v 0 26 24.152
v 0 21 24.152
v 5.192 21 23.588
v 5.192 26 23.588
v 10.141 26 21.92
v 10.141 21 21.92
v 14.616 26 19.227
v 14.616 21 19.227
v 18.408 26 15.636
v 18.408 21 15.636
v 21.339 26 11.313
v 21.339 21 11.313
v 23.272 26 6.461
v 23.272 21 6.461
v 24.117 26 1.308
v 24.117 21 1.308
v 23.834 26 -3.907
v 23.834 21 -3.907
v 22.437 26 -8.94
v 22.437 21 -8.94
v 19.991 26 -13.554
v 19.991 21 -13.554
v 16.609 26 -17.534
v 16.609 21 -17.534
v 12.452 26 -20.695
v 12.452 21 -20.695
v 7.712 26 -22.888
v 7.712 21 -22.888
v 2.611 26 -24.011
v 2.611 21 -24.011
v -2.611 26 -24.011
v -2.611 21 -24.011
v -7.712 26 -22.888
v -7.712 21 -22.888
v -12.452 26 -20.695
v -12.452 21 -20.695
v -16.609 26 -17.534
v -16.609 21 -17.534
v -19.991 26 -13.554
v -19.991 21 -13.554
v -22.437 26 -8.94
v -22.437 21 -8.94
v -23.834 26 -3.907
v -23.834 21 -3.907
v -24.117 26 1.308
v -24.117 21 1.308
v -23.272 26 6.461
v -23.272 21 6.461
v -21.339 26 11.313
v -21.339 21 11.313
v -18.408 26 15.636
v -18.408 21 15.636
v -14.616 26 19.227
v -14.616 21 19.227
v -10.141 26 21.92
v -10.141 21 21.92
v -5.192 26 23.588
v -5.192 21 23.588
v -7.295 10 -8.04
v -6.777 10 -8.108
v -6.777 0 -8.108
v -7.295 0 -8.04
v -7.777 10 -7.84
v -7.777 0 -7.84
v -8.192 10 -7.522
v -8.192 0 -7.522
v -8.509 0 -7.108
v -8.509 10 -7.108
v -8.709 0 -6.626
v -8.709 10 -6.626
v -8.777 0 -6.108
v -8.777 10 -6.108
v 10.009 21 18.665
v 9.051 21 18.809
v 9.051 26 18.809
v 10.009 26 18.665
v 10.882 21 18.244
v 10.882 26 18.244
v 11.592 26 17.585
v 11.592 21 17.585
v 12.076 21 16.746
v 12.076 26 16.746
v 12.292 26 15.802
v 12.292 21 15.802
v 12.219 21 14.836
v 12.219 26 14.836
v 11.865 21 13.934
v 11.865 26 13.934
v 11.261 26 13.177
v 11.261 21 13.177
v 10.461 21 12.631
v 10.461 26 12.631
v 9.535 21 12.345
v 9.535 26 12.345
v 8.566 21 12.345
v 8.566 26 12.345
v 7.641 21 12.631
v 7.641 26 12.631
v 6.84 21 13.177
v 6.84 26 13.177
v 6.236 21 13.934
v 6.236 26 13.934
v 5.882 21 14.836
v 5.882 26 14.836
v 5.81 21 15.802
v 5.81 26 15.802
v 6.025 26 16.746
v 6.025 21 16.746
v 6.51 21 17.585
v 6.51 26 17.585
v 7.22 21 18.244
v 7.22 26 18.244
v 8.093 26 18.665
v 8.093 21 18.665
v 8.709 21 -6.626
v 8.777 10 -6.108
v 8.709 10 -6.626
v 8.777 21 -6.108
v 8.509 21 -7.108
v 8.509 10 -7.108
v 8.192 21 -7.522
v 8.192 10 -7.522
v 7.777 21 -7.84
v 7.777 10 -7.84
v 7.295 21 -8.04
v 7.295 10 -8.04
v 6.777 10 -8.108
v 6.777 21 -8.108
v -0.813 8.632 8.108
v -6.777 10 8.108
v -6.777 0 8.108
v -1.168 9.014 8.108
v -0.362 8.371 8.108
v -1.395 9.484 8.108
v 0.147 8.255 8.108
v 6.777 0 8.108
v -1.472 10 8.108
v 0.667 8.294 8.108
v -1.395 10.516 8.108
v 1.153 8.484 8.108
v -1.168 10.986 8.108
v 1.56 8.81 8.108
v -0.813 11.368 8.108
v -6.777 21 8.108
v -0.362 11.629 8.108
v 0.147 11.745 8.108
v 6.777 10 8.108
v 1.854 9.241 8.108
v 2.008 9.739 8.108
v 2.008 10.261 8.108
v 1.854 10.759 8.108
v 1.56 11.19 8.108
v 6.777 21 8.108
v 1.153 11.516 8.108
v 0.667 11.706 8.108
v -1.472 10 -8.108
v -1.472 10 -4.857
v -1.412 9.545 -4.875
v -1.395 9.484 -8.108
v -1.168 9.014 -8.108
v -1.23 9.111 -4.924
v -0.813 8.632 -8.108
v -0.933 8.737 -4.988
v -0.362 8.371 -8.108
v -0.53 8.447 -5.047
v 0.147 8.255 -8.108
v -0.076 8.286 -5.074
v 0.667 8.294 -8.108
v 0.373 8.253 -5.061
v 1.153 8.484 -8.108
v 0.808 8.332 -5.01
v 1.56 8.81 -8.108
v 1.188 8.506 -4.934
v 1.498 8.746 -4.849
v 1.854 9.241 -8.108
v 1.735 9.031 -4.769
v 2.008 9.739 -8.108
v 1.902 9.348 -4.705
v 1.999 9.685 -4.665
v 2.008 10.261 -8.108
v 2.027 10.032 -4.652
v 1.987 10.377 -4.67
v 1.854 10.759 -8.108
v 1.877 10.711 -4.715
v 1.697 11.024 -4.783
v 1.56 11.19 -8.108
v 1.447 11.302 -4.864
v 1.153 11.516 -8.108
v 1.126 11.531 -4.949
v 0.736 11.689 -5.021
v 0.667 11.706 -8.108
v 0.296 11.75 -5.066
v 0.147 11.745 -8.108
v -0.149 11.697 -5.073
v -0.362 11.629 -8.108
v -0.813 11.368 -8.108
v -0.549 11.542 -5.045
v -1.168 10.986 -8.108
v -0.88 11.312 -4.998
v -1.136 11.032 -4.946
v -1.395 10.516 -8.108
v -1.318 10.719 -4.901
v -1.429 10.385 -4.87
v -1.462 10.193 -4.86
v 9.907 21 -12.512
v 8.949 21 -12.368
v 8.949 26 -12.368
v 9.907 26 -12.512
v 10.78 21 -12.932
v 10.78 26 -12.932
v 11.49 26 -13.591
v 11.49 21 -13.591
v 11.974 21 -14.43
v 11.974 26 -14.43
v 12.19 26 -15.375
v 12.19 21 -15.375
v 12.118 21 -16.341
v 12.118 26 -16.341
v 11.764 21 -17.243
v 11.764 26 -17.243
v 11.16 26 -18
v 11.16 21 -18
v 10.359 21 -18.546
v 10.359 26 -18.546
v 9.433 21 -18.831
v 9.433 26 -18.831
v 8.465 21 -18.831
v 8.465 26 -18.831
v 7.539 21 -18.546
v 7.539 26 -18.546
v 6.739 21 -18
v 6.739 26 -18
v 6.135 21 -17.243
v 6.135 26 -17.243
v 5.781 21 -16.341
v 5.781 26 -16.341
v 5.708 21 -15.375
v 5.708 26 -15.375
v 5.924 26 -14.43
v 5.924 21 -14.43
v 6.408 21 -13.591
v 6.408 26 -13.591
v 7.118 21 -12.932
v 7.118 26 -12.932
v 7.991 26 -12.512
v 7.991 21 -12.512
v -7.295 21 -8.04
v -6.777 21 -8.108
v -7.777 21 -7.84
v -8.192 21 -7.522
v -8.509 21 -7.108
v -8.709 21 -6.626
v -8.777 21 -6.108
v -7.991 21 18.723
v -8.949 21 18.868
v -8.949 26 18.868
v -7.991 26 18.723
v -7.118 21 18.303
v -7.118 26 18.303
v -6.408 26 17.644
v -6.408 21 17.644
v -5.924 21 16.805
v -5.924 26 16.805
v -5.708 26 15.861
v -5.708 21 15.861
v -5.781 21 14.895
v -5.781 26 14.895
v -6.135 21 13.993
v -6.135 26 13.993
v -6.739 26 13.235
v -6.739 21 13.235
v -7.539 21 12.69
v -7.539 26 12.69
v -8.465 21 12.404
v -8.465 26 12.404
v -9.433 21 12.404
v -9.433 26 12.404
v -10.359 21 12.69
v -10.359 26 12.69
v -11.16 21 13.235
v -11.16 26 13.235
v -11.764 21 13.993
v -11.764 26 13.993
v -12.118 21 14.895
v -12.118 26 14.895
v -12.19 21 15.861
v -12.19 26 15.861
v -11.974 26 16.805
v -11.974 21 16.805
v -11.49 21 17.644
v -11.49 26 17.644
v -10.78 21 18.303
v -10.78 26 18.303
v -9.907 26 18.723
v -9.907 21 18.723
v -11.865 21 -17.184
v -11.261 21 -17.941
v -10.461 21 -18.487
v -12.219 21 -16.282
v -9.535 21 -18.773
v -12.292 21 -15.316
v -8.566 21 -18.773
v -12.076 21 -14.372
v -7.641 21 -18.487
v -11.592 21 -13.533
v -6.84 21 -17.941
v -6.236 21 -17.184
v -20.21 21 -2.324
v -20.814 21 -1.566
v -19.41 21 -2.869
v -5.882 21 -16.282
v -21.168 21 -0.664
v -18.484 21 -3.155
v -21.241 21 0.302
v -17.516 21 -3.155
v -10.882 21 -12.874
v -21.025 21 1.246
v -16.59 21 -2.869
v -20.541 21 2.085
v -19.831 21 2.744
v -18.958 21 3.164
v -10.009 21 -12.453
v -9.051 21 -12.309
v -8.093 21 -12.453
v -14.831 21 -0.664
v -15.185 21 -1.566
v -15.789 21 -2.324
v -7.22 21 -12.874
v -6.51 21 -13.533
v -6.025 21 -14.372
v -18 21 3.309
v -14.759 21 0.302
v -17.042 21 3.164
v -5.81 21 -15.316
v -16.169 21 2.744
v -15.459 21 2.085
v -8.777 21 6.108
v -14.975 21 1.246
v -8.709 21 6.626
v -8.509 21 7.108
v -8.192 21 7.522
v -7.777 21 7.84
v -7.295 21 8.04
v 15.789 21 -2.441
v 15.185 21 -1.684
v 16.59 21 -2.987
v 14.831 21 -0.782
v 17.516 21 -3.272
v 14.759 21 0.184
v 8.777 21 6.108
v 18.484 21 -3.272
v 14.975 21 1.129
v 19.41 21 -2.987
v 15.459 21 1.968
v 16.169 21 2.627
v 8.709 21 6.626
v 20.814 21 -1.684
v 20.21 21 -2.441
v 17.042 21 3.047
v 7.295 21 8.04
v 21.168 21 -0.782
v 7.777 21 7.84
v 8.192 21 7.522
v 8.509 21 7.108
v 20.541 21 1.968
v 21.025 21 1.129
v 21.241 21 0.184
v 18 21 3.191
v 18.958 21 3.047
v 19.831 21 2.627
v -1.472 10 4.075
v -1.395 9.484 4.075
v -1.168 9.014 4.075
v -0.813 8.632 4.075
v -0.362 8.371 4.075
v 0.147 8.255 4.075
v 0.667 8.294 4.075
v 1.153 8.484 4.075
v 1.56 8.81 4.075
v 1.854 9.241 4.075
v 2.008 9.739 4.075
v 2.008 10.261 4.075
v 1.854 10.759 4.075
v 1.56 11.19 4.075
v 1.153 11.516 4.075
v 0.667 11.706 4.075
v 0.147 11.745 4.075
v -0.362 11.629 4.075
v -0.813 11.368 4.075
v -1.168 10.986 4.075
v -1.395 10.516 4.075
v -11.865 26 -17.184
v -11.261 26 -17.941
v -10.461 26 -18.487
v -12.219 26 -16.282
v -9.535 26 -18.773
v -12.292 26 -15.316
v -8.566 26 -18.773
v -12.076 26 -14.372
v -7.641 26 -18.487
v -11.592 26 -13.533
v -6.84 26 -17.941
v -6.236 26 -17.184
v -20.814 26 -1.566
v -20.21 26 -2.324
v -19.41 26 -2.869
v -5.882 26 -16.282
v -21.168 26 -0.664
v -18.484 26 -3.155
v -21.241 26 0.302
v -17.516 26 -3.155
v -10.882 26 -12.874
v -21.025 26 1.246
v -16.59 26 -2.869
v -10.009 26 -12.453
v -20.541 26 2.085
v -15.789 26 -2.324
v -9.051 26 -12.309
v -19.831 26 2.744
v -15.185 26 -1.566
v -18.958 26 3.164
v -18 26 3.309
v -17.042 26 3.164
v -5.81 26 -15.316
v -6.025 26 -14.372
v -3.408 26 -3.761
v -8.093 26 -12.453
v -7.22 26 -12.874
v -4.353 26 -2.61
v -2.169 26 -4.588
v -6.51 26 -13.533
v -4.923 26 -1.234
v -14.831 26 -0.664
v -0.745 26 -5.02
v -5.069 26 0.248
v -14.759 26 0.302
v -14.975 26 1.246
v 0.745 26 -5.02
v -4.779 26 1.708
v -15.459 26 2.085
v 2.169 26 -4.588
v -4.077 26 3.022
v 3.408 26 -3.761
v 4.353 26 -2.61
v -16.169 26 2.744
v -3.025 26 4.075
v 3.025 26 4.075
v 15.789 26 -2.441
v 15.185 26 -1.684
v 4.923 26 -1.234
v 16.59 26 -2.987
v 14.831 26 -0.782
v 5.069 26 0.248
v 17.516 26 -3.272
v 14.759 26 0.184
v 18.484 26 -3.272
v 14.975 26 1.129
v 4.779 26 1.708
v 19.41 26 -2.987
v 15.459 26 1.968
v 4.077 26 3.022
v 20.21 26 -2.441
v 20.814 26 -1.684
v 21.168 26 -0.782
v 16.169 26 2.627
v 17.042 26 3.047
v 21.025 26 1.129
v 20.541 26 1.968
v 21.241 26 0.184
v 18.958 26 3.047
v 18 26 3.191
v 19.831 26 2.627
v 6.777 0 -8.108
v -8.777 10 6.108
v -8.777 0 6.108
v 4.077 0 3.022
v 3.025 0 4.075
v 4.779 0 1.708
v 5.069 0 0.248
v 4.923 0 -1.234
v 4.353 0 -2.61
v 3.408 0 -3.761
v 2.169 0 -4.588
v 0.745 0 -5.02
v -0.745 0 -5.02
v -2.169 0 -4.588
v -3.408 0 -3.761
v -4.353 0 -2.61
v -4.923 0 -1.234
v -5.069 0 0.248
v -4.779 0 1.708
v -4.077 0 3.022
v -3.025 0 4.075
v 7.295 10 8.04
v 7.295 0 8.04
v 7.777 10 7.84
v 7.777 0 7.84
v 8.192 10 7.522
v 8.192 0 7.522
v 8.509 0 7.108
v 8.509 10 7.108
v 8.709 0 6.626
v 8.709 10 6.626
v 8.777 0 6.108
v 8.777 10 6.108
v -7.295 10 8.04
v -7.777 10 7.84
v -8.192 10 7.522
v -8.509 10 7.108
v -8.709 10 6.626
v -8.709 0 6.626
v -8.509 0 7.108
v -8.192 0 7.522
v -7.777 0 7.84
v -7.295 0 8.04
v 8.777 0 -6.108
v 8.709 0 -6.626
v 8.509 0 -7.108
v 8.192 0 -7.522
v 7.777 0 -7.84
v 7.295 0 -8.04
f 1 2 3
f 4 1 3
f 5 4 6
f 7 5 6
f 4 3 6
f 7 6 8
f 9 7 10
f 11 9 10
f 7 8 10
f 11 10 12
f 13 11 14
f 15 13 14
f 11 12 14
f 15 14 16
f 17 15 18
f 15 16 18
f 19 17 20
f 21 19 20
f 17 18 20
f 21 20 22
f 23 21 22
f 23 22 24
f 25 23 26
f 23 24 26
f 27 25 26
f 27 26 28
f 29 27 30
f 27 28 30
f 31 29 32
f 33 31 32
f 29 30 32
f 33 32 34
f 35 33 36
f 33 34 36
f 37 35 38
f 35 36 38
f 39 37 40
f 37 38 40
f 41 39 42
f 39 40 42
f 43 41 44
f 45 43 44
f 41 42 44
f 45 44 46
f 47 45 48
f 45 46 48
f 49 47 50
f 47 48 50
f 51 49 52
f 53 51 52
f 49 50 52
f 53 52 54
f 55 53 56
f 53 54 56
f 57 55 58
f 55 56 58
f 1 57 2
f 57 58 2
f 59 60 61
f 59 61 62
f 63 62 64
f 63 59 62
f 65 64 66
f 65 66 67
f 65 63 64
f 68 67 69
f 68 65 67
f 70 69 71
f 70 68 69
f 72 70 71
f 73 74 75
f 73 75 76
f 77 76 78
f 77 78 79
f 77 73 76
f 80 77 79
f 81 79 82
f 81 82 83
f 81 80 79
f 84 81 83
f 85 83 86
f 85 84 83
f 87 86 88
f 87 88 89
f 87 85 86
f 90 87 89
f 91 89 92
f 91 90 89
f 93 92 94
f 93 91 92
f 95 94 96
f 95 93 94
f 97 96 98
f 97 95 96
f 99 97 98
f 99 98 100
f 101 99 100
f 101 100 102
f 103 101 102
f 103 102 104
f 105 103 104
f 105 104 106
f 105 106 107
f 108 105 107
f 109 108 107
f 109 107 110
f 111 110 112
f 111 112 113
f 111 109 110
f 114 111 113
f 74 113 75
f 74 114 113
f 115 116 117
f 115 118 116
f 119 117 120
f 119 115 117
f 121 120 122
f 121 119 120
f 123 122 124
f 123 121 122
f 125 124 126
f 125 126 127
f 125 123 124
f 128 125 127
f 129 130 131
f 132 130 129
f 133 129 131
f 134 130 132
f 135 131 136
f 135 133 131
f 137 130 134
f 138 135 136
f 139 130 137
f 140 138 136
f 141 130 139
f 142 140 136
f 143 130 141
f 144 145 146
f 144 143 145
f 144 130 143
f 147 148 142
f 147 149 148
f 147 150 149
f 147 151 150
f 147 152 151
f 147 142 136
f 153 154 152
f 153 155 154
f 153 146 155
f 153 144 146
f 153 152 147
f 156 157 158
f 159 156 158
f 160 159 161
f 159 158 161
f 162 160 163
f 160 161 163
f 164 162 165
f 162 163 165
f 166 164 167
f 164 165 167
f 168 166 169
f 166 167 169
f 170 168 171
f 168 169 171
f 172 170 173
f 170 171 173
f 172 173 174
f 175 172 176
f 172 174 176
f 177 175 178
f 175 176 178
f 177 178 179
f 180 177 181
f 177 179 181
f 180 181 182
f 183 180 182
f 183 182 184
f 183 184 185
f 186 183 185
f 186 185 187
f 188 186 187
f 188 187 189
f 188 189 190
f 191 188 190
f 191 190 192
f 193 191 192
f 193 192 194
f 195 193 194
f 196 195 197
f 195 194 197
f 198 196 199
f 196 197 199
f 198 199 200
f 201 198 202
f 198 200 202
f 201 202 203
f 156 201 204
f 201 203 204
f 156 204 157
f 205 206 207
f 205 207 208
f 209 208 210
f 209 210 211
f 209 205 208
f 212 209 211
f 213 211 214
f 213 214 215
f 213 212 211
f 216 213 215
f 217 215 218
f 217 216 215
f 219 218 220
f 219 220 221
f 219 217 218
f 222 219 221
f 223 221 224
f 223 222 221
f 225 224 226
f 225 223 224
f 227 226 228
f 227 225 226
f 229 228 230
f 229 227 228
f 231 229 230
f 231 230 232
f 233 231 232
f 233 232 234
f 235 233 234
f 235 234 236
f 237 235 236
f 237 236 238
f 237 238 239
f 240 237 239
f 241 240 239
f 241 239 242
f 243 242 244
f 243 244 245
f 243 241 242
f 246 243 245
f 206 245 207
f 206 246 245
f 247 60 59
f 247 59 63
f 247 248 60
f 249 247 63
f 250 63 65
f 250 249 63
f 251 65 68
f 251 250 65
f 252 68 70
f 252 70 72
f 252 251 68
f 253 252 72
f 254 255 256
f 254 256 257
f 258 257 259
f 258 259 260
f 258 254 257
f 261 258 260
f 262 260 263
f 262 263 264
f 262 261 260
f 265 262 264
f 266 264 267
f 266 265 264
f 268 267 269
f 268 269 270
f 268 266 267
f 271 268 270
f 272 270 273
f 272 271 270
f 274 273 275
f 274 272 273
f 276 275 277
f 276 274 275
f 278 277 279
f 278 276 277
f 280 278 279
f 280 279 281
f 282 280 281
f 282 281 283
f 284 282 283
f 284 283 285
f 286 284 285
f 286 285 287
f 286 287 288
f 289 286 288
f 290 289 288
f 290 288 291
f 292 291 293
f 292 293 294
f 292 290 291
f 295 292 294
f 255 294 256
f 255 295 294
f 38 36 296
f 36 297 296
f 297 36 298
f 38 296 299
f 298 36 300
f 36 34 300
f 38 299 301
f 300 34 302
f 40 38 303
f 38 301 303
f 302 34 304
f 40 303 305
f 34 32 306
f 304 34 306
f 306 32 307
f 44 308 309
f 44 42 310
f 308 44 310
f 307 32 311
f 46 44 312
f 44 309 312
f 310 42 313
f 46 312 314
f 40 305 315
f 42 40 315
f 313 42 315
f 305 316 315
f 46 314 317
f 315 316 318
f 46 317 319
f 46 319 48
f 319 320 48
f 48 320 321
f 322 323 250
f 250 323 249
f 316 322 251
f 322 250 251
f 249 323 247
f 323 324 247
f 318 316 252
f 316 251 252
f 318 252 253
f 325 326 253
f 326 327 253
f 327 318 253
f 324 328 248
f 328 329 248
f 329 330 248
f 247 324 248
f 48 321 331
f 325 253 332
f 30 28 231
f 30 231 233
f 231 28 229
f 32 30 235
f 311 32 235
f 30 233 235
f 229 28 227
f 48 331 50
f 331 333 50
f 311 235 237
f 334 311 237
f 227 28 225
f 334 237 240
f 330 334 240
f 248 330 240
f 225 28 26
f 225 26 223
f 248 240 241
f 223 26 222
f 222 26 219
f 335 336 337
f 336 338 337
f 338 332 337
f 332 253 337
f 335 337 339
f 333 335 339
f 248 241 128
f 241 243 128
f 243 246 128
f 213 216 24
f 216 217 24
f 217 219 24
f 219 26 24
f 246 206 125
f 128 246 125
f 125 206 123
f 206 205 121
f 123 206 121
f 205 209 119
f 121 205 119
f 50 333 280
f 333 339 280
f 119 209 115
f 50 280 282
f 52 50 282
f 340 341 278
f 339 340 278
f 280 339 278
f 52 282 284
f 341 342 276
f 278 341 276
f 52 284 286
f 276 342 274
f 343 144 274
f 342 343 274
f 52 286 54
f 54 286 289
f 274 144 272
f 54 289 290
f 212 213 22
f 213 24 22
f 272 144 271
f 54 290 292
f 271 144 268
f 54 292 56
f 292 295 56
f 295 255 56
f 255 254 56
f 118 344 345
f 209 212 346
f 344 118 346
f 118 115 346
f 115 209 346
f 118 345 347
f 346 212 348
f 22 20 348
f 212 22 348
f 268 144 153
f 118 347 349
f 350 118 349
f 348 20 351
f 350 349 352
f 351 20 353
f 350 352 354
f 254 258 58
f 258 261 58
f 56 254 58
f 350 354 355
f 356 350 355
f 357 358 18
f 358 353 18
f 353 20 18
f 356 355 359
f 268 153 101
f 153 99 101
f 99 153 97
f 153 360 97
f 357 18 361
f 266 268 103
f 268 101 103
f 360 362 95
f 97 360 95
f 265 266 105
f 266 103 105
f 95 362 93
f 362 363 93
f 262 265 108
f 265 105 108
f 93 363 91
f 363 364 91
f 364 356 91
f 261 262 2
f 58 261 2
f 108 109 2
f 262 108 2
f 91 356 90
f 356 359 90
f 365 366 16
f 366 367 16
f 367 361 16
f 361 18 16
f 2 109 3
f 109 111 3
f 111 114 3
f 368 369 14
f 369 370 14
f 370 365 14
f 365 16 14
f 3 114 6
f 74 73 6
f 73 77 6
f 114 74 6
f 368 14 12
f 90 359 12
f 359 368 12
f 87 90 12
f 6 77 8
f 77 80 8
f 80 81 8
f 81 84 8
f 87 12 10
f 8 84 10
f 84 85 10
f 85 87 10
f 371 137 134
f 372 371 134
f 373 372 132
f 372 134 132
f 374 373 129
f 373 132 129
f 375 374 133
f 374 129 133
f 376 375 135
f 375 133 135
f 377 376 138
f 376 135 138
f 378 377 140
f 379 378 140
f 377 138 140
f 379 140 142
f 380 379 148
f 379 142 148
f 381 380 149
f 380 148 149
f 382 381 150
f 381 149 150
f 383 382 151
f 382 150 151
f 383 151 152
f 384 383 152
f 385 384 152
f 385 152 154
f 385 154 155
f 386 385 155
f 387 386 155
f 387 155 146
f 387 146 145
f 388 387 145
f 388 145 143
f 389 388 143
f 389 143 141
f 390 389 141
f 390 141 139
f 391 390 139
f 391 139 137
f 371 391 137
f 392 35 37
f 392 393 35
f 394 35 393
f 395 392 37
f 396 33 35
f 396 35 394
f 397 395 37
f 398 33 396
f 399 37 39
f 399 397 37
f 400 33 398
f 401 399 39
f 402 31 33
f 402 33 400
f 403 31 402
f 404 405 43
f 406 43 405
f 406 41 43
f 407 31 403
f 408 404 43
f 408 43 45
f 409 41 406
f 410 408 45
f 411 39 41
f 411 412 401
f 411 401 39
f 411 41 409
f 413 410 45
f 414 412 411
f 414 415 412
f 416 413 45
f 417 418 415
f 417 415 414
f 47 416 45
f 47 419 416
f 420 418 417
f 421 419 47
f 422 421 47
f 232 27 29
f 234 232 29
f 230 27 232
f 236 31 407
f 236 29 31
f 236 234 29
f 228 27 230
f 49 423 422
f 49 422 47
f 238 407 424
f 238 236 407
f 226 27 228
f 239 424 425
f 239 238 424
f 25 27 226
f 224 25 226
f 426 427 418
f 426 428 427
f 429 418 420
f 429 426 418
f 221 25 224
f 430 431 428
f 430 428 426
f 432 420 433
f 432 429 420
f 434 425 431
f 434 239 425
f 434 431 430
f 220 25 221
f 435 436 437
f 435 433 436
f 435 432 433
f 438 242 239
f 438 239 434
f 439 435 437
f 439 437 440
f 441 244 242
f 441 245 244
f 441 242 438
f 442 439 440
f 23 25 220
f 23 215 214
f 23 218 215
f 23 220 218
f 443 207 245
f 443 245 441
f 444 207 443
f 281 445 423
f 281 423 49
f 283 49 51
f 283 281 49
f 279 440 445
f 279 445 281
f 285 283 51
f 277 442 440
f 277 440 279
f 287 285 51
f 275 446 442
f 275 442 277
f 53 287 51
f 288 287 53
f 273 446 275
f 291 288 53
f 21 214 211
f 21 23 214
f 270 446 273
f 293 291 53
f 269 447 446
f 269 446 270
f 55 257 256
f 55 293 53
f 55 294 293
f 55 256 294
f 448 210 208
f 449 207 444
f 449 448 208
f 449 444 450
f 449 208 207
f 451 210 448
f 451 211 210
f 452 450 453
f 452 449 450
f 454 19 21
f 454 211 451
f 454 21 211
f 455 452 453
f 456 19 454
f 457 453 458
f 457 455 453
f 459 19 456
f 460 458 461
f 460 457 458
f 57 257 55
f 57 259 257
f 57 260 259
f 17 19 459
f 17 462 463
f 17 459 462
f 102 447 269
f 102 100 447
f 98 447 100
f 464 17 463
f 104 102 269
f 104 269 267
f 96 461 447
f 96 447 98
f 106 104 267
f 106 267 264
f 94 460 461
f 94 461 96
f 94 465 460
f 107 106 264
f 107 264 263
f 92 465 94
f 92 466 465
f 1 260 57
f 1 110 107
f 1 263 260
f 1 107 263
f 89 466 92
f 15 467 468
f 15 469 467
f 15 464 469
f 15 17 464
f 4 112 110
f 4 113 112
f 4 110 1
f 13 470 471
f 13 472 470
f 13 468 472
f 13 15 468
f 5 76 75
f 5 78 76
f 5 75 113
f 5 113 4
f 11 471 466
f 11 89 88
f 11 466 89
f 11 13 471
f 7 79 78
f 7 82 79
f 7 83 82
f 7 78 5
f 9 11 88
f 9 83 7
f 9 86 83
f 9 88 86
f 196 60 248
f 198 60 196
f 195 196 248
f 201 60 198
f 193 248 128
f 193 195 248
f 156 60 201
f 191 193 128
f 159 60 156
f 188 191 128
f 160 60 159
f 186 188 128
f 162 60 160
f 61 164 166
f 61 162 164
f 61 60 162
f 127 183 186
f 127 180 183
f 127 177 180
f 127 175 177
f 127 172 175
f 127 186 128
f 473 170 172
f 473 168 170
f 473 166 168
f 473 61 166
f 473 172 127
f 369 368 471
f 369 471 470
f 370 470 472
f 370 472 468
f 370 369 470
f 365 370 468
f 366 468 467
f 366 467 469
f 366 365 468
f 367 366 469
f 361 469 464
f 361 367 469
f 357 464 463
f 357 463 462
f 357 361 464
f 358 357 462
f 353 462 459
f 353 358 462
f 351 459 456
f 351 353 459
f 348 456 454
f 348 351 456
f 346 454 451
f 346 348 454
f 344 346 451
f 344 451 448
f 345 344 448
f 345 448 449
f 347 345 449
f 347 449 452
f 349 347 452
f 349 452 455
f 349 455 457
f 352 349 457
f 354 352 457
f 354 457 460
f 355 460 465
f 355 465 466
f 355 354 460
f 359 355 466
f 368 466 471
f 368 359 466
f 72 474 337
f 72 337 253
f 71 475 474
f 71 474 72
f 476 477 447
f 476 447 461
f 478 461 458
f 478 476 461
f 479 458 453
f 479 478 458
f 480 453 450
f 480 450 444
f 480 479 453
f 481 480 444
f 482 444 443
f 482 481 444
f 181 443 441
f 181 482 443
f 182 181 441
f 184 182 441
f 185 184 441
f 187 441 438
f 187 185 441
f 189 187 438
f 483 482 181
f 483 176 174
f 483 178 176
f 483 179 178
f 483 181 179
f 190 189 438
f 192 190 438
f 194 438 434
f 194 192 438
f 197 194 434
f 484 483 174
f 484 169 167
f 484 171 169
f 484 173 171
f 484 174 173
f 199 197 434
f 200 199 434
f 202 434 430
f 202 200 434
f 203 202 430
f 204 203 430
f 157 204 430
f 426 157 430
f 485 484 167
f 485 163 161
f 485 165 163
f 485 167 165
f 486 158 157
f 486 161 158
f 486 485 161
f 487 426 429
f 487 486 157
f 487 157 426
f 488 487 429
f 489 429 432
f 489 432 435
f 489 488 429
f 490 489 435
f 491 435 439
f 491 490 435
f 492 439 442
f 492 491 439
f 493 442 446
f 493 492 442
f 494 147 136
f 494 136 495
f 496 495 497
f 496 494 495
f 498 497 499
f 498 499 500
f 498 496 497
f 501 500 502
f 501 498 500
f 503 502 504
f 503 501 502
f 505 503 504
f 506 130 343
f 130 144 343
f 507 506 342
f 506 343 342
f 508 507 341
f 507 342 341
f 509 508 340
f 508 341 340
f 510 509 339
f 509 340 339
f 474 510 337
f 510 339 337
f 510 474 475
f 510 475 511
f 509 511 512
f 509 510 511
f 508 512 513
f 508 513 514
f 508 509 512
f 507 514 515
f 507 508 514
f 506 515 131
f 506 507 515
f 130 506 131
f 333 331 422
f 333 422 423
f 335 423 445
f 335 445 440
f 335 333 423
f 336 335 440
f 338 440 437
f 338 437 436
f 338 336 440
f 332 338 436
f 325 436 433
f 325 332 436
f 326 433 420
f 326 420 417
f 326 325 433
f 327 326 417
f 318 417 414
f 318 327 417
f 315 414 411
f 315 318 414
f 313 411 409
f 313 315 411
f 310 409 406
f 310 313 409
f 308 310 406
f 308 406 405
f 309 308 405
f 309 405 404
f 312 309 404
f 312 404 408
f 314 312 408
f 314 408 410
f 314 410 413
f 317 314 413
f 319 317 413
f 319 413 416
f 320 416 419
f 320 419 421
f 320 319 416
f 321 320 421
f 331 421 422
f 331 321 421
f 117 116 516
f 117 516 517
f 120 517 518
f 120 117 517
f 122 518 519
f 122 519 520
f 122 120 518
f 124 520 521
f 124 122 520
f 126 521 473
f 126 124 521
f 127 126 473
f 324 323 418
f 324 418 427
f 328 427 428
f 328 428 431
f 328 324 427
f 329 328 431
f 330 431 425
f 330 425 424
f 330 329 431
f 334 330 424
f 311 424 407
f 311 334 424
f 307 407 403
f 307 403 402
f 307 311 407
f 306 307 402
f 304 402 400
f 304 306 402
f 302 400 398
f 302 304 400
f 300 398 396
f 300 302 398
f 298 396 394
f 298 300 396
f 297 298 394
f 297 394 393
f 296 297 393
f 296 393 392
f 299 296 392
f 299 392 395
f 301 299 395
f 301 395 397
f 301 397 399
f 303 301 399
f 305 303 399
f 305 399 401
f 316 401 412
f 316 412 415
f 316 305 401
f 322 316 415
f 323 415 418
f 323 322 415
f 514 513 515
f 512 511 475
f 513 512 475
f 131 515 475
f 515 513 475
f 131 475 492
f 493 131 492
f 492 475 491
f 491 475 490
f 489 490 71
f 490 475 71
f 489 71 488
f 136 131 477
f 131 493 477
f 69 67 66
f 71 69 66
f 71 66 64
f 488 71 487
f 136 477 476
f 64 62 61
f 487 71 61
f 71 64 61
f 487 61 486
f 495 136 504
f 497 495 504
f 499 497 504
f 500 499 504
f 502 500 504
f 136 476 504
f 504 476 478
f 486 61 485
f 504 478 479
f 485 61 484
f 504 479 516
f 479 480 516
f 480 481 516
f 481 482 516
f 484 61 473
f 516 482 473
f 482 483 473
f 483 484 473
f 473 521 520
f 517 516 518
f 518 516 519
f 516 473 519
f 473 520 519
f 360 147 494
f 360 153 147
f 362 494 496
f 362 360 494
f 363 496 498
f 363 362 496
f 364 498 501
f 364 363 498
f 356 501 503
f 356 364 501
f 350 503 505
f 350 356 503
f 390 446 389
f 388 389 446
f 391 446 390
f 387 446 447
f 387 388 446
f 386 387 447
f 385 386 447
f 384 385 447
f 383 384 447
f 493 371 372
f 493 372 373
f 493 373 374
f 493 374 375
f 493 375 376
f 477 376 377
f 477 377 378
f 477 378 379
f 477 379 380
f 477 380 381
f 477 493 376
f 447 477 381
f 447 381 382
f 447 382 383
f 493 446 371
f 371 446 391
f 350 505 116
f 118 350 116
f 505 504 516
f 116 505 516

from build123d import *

# Parameters (mm, degrees)
SKETCH_1_W                      = 30
SKETCH_1_H                      = 30
SKETCH_1_W_2                    = 21.5
SKETCH_1_H_2                    = 21.5
EXTRUDE_1_DEPTH                 = 5
SKETCH_2_W                      = 30
SKETCH_2_H                      = 30
EXTRUDE_2_DEPTH                 = 5
SKETCH_4_W                      = 17.554664
SKETCH_4_H                      = 16.21575
EXTRUDE_3_DEPTH                 = 11
SKETCH_5_R                      = 24.152219
SKETCH_5_R_2                    = 3.25
EXTRUDE_4_DEPTH                 = 5
CUT_EXTRUDE_2_DEPTH             = 21
FILLET_1_R                      = 2
SKETCH_10_W                     = 21.5
SKETCH_10_H                     = 21.5
EXTRUDE_5_DEPTH                 = 5
CUT_EXTRUDE_3_REACH             = 49.959
SKETCH_11_R                     = 1.75
CUT_EXTRUDE_3_DIRECTION_2_REACH = 49.959
SKETCH_12_R                     = 24.152219
CUT_EXTRUDE_4_DEPTH             = 21
CUT_EXTRUDE_5_REACH             = 42.096


with BuildPart() as part:
    # 草图1 → 凸台-拉伸1 (new body)
    with BuildSketch(Plane(origin=(0, 0, 0), x_dir=(1, 0, 0), z_dir=(0, 1, 0))):
        Rectangle(SKETCH_1_W, SKETCH_1_H)
        Rectangle(SKETCH_1_W_2, SKETCH_1_H_2, mode=Mode.SUBTRACT)
    extrude(amount=EXTRUDE_1_DEPTH)

    # 草图2 → 凸台-拉伸2 (add)
    with BuildSketch(Plane(origin=(0, 5, 0), x_dir=(1, 0, 0), z_dir=(0, 1, 0))):
        Rectangle(SKETCH_2_W, SKETCH_2_H)
    extrude(amount=EXTRUDE_2_DEPTH)

    # 草图4 → 凸台-拉伸3 (add)
    with BuildSketch(Plane(origin=(0, 10, 0), x_dir=(1, 0, 0), z_dir=(0, 1, 0))):
        Rectangle(SKETCH_4_W, SKETCH_4_H)
    extrude(amount=EXTRUDE_3_DEPTH)

    # 草图5 → 凸台-拉伸4 (add)
    with BuildSketch(Plane(origin=(0, 21, 0), x_dir=(1, 0, 0), z_dir=(0, 1, 0))):
        with Locations(Location((0, 0, 0), (0, 0, 270))):
            Circle(SKETCH_5_R)
        with Locations(Location((8.9491, 15.617734, 0), (0, 0, 270))):
            Circle(SKETCH_5_R_2, mode=Mode.SUBTRACT)
        with Locations(Location((17.999904, 0.058719, 0), (0, 0, 270))):
            Circle(SKETCH_5_R_2, mode=Mode.SUBTRACT)
        with Locations(Location((9.050804, -15.559015, 0), (0, 0, 270))):
            Circle(SKETCH_5_R_2, mode=Mode.SUBTRACT)
        with Locations(Location((-8.9491, -15.617734, 0), (0, 0, 270))):
            Circle(SKETCH_5_R_2, mode=Mode.SUBTRACT)
        with Locations(Location((-17.999904, -0.058719, 0), (0, 0, 270))):
            Circle(SKETCH_5_R_2, mode=Mode.SUBTRACT)
        with Locations(Location((-9.050804, 15.559015, 0), (0, 0, 270))):
            Circle(SKETCH_5_R_2, mode=Mode.SUBTRACT)
    extrude(amount=EXTRUDE_4_DEPTH)

    # 草图6 → 切除-拉伸2 (cut)
    with BuildSketch(Plane.XZ.offset(-5)):
        with BuildLine():
            Line((-3.024897, 4.075), (3.024897, 4.075))
            ThreePointArc((3.024897, 4.075), (0, -5.075), (-3.024897, 4.075))
        make_face()
    extrude(amount=-CUT_EXTRUDE_2_DEPTH, mode=Mode.SUBTRACT)

    # 圆角1
    fillet_1_edges = [part.edges().sort_by_distance(p)[0] for p in [
        (-8.777332, 15.5, -8.107875),
        (-8.777332, 15.5, 8.107875),
        (8.777332, 15.5, 8.107875),
        (8.777332, 15.5, -8.107875),
        (15, 5, 15),
        (-15, 5, 15),
        (-15, 5, -15),
        (15, 5, -15),
    ]]
    fillet(fillet_1_edges, radius=FILLET_1_R)

    # 草图10 → 凸台-拉伸5 (add)
    with BuildSketch(Plane.XZ.offset(-5)):
        Rectangle(SKETCH_10_W, SKETCH_10_H)
    extrude(amount=EXTRUDE_5_DEPTH)

    # 切除-拉伸3: up to this face of the body (flat: up to its plane)
    cut_extrude_3_end = Plane(part.part.faces().sort_by_distance((0, 5, -15))[0])
    # 草图11 → 切除-拉伸3 (cut, up to the picked face)
    with BuildSketch(Plane.XY.offset(8.107875), mode=Mode.PRIVATE) as cut_extrude_3_sk1:
        with Locations(Location((0.277648, 10, 0), (0, 0, 180))):
            Circle(SKETCH_11_R)
    cut_extrude_3_tool1 = split(extrude(cut_extrude_3_sk1.sketch, amount=-CUT_EXTRUDE_3_REACH, mode=Mode.PRIVATE), bisect_by=cut_extrude_3_end, keep=Keep.BOTH, mode=Mode.PRIVATE)
    add(cut_extrude_3_tool1.solids().sort_by(Axis((0.277648, 10, 8.107875), (0, 0, -1)))[0], mode=Mode.SUBTRACT)

    # 草图11 → 切除-拉伸3 direction 2 (cut, up to next)
    with BuildSketch(Plane.XY.offset(8.107875), mode=Mode.PRIVATE) as cut_extrude_3_direction_2_sk1:
        with Locations(Location((0.277648, 10, 0), (0, 0, 180))):
            Circle(SKETCH_11_R)
    cut_extrude_3_direction_2_tool1 = extrude(cut_extrude_3_direction_2_sk1.sketch, amount=CUT_EXTRUDE_3_DIRECTION_2_REACH, mode=Mode.PRIVATE) & part.part
    add(cut_extrude_3_direction_2_tool1.solids().sort_by_distance((0.277648, 10, 8.107875))[0], mode=Mode.SUBTRACT)

    # 草图12 → 切除-拉伸4 (cut)
    with BuildSketch(Plane.XZ.offset(-21)):
        with Locations(Location((0, 0, 0), (0, 0, 90))):
            Circle(SKETCH_12_R)
        with BuildLine():
            Line((-8.777332, -6.107875), (-8.777332, 6.107875))
            ThreePointArc((-8.777332, 6.107875), (-8.191546, 7.522088), (-6.777332, 8.107875))
            Line((-6.777332, 8.107875), (6.777332, 8.107875))
            ThreePointArc((6.777332, 8.107875), (8.191546, 7.522088), (8.777332, 6.107875))
            Line((8.777332, 6.107875), (8.777332, -6.107875))
            ThreePointArc((8.777332, -6.107875), (8.191546, -7.522088), (6.777332, -8.107875))
            Line((6.777332, -8.107875), (-6.777332, -8.107875))
            ThreePointArc((-6.777332, -8.107875), (-8.191546, -7.522088), (-8.777332, -6.107875))
        make_face(mode=Mode.SUBTRACT)
    extrude(amount=CUT_EXTRUDE_4_DEPTH, mode=Mode.SUBTRACT)

    # 草图13 → 切除-拉伸5 (cut, up to next)
    with BuildSketch(Plane(origin=(0, 5, 0), x_dir=(1, 0, 0), z_dir=(0, 1, 0)), mode=Mode.PRIVATE) as cut_extrude_5_sk1:
        with BuildLine():
            Line((-3.024897, -4.075), (3.024897, -4.075))
            ThreePointArc((3.024897, -4.075), (0, 5.075), (-3.024897, -4.075))
        make_face()
    cut_extrude_5_tool1 = extrude(cut_extrude_5_sk1.sketch, amount=-CUT_EXTRUDE_5_REACH, mode=Mode.PRIVATE) & part.part
    add(cut_extrude_5_tool1.solids().sort_by_distance((0, 5, -0.240279))[0], mode=Mode.SUBTRACT)


solid = part.part
